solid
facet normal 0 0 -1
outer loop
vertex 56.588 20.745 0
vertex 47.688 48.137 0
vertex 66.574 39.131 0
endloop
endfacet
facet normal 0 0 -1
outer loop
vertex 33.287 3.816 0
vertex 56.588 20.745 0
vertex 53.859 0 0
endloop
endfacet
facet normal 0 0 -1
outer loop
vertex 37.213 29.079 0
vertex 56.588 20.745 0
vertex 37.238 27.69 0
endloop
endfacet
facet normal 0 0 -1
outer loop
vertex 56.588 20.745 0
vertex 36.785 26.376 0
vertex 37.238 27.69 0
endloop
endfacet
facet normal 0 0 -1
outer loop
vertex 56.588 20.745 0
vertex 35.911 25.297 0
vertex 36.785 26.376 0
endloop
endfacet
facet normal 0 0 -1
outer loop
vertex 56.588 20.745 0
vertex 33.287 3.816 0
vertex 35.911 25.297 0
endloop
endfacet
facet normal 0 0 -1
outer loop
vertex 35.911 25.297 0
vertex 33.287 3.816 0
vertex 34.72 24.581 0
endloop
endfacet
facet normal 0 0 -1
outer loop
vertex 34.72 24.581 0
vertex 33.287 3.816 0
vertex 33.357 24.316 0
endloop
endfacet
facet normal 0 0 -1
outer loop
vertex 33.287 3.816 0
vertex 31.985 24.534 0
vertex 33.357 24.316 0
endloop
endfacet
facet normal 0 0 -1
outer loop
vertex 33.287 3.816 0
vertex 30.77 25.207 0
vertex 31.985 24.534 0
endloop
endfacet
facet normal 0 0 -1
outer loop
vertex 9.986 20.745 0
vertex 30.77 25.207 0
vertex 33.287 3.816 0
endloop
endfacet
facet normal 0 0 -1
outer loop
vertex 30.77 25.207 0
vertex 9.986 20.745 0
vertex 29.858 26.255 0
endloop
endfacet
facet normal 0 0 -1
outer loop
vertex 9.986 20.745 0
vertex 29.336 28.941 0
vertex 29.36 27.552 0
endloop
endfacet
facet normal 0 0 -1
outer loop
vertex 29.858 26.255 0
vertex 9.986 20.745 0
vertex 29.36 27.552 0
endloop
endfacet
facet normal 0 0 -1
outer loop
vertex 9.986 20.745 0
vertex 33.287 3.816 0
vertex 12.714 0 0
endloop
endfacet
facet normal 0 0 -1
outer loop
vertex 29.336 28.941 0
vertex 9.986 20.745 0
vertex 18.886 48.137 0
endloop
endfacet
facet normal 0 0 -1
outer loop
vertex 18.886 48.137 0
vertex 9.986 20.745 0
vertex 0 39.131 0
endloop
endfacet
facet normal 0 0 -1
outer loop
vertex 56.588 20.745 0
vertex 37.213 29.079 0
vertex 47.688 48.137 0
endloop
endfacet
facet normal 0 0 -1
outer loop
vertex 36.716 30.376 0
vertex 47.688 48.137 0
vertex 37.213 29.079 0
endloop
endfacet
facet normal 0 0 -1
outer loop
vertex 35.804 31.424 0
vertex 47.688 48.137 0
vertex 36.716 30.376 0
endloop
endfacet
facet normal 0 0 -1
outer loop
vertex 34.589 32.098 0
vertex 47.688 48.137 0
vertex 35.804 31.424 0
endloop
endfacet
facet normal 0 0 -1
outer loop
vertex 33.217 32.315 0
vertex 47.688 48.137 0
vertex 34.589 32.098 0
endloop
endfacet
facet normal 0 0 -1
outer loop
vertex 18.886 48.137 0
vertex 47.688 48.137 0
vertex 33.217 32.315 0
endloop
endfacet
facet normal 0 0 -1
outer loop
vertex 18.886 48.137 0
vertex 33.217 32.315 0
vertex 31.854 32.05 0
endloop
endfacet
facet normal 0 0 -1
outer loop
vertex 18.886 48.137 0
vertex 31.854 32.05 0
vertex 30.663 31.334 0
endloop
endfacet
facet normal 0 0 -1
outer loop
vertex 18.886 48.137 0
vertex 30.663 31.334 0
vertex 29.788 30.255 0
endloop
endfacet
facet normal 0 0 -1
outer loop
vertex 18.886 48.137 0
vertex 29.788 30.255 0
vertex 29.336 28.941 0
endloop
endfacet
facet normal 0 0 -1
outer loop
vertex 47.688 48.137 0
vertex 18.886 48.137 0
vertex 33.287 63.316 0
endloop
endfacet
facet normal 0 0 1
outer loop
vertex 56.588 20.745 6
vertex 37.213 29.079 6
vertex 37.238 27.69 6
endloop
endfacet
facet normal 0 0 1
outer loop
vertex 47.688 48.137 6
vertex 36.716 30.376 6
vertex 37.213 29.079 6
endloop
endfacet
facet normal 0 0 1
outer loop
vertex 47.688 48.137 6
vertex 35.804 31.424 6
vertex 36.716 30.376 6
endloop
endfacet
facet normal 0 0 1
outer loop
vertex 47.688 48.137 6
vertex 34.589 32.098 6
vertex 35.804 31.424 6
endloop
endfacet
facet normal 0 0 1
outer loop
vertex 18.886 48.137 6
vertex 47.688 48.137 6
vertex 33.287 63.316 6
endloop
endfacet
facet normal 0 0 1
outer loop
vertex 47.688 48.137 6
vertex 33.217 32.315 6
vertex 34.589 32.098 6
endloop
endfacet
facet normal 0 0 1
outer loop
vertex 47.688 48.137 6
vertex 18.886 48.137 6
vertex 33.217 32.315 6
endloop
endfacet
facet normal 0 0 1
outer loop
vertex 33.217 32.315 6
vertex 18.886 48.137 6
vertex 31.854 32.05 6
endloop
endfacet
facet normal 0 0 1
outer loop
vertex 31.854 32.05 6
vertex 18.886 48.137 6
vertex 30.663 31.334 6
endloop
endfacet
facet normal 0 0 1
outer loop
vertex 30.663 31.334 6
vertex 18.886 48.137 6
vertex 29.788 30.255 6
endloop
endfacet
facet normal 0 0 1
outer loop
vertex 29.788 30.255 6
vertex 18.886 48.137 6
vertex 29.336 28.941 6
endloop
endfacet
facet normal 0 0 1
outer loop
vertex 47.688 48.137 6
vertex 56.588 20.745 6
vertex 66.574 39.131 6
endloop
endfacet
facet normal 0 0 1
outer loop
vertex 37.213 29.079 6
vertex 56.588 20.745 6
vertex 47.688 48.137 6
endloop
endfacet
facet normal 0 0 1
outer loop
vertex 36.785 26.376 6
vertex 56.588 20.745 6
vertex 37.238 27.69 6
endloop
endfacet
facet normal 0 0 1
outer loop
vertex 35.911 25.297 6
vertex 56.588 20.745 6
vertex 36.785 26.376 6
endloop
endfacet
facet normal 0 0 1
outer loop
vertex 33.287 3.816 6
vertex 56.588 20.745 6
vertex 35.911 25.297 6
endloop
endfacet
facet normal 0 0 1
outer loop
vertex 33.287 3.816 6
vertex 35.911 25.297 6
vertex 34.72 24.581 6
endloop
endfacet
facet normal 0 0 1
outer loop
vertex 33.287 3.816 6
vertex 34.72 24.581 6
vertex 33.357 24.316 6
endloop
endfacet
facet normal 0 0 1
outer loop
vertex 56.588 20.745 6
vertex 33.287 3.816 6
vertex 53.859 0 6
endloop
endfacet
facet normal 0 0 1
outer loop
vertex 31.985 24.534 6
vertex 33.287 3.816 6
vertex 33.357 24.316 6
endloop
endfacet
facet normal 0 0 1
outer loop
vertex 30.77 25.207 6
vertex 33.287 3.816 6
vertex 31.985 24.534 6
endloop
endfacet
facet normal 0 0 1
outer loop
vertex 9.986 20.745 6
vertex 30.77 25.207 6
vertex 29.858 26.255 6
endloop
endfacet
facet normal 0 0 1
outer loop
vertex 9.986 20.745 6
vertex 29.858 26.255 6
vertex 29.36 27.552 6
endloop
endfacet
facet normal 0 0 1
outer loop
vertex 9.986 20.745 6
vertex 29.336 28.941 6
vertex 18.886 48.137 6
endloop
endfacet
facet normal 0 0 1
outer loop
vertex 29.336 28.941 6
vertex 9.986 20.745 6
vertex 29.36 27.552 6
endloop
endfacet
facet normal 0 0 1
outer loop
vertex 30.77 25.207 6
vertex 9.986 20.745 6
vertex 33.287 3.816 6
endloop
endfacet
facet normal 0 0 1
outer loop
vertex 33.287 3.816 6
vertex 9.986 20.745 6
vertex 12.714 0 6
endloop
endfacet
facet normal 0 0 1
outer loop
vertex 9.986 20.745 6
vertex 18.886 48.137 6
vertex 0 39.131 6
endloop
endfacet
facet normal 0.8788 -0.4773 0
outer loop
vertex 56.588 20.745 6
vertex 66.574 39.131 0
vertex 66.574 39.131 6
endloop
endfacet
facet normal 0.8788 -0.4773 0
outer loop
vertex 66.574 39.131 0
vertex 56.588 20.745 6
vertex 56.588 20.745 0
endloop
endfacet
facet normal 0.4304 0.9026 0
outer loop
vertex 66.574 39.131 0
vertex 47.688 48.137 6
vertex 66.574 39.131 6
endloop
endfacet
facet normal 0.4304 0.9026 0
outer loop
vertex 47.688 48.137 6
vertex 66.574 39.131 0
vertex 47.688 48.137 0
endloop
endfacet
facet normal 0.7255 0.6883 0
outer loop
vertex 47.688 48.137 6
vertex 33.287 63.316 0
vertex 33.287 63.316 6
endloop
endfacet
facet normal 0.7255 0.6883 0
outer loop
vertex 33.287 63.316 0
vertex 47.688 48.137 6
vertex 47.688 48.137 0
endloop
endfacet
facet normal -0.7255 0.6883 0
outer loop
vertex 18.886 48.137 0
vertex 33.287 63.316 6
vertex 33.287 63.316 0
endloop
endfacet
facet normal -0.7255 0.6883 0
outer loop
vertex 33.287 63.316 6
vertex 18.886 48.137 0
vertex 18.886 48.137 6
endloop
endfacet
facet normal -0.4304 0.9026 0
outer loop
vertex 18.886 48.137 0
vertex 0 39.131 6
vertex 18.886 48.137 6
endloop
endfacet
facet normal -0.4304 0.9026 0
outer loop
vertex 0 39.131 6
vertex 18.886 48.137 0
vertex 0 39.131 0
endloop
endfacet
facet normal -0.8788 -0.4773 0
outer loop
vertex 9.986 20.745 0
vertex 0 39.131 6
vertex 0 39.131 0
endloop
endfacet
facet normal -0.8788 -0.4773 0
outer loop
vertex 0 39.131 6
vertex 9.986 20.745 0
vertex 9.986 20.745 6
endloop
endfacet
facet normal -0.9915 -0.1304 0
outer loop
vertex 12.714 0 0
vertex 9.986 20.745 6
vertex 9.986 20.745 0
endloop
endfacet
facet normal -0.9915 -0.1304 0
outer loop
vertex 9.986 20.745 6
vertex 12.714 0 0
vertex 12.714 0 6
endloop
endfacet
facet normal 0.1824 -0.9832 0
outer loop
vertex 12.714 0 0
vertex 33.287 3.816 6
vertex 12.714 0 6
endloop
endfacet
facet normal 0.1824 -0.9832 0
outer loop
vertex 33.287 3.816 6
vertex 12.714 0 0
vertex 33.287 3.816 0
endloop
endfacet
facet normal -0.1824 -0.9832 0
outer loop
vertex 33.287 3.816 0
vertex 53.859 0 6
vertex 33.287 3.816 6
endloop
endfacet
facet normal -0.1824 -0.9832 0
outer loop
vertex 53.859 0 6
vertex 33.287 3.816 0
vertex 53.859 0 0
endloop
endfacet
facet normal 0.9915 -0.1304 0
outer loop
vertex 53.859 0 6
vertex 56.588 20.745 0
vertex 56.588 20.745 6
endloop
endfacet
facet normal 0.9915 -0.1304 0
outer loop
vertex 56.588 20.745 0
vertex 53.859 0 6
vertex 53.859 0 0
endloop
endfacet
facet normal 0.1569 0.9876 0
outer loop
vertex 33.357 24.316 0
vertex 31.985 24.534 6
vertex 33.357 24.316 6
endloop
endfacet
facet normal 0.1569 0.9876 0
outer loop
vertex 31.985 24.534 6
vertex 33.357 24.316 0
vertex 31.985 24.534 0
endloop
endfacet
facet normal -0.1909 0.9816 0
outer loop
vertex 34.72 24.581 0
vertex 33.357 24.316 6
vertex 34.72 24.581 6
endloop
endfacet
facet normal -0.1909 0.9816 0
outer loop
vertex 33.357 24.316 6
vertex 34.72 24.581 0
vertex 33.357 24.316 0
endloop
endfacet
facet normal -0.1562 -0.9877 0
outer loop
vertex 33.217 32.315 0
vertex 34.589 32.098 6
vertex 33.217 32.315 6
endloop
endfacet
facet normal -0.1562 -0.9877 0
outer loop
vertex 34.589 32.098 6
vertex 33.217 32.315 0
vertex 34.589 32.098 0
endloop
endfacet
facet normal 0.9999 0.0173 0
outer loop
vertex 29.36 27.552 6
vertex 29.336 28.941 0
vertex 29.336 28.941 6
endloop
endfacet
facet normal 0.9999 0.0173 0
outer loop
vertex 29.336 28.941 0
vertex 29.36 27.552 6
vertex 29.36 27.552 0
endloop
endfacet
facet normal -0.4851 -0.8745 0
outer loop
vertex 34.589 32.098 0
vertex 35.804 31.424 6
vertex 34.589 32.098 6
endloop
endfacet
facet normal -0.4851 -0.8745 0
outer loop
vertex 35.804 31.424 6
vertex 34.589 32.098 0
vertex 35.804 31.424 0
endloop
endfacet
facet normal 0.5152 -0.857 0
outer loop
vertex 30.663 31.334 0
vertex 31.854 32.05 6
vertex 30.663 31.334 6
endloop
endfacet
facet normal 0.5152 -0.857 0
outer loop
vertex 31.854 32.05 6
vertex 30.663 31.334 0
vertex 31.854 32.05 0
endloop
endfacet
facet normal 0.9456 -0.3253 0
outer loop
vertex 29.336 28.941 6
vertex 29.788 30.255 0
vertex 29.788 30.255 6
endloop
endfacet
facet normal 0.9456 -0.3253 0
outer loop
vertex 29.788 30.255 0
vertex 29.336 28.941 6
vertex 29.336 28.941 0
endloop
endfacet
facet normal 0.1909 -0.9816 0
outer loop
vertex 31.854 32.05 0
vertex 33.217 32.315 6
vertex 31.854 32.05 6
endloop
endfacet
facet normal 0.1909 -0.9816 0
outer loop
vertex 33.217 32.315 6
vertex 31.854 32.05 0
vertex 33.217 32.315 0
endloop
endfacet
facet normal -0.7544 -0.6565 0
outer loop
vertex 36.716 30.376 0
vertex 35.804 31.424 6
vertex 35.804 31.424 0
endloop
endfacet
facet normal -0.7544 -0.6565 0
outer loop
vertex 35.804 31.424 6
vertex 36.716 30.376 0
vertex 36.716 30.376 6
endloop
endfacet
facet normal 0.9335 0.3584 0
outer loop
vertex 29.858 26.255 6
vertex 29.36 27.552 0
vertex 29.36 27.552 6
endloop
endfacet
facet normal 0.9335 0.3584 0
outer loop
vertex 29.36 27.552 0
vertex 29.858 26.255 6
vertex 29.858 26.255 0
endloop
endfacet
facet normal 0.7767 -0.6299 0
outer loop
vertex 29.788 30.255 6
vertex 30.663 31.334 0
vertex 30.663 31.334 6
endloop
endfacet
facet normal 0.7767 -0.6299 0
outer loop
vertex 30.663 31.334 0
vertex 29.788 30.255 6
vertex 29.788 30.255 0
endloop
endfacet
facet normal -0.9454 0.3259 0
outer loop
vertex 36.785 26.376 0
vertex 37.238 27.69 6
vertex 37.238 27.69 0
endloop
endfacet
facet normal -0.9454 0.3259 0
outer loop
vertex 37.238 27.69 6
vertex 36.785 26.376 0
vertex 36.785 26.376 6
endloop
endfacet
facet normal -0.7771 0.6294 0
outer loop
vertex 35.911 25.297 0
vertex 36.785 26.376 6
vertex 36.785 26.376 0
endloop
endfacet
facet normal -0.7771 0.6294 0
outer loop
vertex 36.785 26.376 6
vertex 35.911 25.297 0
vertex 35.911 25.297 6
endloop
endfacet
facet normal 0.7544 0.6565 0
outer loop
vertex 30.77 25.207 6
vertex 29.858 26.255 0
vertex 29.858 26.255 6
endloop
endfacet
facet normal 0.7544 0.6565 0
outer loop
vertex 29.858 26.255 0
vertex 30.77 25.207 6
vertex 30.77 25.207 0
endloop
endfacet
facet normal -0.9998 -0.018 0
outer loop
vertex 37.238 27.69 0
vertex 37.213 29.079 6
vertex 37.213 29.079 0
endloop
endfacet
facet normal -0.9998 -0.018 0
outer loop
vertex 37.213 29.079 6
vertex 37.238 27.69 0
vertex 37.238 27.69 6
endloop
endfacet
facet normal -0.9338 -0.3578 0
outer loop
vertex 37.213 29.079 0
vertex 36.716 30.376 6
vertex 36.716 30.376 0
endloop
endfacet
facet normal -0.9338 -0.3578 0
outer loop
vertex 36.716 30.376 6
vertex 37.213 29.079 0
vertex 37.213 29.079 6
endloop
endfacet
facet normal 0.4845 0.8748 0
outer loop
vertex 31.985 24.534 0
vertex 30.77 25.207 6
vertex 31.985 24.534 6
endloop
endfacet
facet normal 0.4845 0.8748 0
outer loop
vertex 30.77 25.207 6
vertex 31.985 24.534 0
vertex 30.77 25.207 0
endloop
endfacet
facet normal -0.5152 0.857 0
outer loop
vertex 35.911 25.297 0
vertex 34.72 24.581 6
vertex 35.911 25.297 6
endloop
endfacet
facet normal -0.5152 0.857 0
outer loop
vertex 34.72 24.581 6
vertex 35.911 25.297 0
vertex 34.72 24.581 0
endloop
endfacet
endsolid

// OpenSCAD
$fn = 32;

// ----------------------------------------------------------------------
// Star wheel: 5-point blunt, R35
// ----------------------------------------------------------------------

// --- parameters (mm) ---
n_points = 5;             // number of points / teeth
r_out = 35;               // tip radius
r_in = 24.5;              // root radius
bore_r = 4;               // centre bore radius
plate_t = 6;              // plate thickness, Z (extrusion height)
bore_d = 8;               // centre bore diameter
fit_tol = 0.05;           // declared fit tolerance (prompt contract)
free_tol = 0.3;           // declared free tolerance (prompt contract)

profile = [[33.287, 63.316], [18.886, 48.137], [0, 39.131], [9.986, 20.745], [12.714, 0], [33.287, 3.816], [53.859, 0], [56.588, 20.745], [66.574, 39.131], [47.688, 48.137]];  // primary outline, 10 points, counter clockwise
void_1 = [[37.213, 29.079], [36.716, 30.376], [35.804, 31.424], [34.589, 32.098], [33.217, 32.315], [31.854, 32.05], [30.663, 31.334], [29.788, 30.255], [29.336, 28.941], [29.36, 27.552], [29.858, 26.255], [30.77, 25.207], [31.985, 24.534], [33.357, 24.316], [34.72, 24.581], [35.911, 25.297], [36.785, 26.376], [37.238, 27.69]];  // centre bore, 18 points

// --- the one profile operation ---
difference() {
  linear_extrude(height = plate_t) polygon(points = profile);
  translate([0, 0, -1])
    linear_extrude(height = plate_t + 2) polygon(points = void_1);
}
